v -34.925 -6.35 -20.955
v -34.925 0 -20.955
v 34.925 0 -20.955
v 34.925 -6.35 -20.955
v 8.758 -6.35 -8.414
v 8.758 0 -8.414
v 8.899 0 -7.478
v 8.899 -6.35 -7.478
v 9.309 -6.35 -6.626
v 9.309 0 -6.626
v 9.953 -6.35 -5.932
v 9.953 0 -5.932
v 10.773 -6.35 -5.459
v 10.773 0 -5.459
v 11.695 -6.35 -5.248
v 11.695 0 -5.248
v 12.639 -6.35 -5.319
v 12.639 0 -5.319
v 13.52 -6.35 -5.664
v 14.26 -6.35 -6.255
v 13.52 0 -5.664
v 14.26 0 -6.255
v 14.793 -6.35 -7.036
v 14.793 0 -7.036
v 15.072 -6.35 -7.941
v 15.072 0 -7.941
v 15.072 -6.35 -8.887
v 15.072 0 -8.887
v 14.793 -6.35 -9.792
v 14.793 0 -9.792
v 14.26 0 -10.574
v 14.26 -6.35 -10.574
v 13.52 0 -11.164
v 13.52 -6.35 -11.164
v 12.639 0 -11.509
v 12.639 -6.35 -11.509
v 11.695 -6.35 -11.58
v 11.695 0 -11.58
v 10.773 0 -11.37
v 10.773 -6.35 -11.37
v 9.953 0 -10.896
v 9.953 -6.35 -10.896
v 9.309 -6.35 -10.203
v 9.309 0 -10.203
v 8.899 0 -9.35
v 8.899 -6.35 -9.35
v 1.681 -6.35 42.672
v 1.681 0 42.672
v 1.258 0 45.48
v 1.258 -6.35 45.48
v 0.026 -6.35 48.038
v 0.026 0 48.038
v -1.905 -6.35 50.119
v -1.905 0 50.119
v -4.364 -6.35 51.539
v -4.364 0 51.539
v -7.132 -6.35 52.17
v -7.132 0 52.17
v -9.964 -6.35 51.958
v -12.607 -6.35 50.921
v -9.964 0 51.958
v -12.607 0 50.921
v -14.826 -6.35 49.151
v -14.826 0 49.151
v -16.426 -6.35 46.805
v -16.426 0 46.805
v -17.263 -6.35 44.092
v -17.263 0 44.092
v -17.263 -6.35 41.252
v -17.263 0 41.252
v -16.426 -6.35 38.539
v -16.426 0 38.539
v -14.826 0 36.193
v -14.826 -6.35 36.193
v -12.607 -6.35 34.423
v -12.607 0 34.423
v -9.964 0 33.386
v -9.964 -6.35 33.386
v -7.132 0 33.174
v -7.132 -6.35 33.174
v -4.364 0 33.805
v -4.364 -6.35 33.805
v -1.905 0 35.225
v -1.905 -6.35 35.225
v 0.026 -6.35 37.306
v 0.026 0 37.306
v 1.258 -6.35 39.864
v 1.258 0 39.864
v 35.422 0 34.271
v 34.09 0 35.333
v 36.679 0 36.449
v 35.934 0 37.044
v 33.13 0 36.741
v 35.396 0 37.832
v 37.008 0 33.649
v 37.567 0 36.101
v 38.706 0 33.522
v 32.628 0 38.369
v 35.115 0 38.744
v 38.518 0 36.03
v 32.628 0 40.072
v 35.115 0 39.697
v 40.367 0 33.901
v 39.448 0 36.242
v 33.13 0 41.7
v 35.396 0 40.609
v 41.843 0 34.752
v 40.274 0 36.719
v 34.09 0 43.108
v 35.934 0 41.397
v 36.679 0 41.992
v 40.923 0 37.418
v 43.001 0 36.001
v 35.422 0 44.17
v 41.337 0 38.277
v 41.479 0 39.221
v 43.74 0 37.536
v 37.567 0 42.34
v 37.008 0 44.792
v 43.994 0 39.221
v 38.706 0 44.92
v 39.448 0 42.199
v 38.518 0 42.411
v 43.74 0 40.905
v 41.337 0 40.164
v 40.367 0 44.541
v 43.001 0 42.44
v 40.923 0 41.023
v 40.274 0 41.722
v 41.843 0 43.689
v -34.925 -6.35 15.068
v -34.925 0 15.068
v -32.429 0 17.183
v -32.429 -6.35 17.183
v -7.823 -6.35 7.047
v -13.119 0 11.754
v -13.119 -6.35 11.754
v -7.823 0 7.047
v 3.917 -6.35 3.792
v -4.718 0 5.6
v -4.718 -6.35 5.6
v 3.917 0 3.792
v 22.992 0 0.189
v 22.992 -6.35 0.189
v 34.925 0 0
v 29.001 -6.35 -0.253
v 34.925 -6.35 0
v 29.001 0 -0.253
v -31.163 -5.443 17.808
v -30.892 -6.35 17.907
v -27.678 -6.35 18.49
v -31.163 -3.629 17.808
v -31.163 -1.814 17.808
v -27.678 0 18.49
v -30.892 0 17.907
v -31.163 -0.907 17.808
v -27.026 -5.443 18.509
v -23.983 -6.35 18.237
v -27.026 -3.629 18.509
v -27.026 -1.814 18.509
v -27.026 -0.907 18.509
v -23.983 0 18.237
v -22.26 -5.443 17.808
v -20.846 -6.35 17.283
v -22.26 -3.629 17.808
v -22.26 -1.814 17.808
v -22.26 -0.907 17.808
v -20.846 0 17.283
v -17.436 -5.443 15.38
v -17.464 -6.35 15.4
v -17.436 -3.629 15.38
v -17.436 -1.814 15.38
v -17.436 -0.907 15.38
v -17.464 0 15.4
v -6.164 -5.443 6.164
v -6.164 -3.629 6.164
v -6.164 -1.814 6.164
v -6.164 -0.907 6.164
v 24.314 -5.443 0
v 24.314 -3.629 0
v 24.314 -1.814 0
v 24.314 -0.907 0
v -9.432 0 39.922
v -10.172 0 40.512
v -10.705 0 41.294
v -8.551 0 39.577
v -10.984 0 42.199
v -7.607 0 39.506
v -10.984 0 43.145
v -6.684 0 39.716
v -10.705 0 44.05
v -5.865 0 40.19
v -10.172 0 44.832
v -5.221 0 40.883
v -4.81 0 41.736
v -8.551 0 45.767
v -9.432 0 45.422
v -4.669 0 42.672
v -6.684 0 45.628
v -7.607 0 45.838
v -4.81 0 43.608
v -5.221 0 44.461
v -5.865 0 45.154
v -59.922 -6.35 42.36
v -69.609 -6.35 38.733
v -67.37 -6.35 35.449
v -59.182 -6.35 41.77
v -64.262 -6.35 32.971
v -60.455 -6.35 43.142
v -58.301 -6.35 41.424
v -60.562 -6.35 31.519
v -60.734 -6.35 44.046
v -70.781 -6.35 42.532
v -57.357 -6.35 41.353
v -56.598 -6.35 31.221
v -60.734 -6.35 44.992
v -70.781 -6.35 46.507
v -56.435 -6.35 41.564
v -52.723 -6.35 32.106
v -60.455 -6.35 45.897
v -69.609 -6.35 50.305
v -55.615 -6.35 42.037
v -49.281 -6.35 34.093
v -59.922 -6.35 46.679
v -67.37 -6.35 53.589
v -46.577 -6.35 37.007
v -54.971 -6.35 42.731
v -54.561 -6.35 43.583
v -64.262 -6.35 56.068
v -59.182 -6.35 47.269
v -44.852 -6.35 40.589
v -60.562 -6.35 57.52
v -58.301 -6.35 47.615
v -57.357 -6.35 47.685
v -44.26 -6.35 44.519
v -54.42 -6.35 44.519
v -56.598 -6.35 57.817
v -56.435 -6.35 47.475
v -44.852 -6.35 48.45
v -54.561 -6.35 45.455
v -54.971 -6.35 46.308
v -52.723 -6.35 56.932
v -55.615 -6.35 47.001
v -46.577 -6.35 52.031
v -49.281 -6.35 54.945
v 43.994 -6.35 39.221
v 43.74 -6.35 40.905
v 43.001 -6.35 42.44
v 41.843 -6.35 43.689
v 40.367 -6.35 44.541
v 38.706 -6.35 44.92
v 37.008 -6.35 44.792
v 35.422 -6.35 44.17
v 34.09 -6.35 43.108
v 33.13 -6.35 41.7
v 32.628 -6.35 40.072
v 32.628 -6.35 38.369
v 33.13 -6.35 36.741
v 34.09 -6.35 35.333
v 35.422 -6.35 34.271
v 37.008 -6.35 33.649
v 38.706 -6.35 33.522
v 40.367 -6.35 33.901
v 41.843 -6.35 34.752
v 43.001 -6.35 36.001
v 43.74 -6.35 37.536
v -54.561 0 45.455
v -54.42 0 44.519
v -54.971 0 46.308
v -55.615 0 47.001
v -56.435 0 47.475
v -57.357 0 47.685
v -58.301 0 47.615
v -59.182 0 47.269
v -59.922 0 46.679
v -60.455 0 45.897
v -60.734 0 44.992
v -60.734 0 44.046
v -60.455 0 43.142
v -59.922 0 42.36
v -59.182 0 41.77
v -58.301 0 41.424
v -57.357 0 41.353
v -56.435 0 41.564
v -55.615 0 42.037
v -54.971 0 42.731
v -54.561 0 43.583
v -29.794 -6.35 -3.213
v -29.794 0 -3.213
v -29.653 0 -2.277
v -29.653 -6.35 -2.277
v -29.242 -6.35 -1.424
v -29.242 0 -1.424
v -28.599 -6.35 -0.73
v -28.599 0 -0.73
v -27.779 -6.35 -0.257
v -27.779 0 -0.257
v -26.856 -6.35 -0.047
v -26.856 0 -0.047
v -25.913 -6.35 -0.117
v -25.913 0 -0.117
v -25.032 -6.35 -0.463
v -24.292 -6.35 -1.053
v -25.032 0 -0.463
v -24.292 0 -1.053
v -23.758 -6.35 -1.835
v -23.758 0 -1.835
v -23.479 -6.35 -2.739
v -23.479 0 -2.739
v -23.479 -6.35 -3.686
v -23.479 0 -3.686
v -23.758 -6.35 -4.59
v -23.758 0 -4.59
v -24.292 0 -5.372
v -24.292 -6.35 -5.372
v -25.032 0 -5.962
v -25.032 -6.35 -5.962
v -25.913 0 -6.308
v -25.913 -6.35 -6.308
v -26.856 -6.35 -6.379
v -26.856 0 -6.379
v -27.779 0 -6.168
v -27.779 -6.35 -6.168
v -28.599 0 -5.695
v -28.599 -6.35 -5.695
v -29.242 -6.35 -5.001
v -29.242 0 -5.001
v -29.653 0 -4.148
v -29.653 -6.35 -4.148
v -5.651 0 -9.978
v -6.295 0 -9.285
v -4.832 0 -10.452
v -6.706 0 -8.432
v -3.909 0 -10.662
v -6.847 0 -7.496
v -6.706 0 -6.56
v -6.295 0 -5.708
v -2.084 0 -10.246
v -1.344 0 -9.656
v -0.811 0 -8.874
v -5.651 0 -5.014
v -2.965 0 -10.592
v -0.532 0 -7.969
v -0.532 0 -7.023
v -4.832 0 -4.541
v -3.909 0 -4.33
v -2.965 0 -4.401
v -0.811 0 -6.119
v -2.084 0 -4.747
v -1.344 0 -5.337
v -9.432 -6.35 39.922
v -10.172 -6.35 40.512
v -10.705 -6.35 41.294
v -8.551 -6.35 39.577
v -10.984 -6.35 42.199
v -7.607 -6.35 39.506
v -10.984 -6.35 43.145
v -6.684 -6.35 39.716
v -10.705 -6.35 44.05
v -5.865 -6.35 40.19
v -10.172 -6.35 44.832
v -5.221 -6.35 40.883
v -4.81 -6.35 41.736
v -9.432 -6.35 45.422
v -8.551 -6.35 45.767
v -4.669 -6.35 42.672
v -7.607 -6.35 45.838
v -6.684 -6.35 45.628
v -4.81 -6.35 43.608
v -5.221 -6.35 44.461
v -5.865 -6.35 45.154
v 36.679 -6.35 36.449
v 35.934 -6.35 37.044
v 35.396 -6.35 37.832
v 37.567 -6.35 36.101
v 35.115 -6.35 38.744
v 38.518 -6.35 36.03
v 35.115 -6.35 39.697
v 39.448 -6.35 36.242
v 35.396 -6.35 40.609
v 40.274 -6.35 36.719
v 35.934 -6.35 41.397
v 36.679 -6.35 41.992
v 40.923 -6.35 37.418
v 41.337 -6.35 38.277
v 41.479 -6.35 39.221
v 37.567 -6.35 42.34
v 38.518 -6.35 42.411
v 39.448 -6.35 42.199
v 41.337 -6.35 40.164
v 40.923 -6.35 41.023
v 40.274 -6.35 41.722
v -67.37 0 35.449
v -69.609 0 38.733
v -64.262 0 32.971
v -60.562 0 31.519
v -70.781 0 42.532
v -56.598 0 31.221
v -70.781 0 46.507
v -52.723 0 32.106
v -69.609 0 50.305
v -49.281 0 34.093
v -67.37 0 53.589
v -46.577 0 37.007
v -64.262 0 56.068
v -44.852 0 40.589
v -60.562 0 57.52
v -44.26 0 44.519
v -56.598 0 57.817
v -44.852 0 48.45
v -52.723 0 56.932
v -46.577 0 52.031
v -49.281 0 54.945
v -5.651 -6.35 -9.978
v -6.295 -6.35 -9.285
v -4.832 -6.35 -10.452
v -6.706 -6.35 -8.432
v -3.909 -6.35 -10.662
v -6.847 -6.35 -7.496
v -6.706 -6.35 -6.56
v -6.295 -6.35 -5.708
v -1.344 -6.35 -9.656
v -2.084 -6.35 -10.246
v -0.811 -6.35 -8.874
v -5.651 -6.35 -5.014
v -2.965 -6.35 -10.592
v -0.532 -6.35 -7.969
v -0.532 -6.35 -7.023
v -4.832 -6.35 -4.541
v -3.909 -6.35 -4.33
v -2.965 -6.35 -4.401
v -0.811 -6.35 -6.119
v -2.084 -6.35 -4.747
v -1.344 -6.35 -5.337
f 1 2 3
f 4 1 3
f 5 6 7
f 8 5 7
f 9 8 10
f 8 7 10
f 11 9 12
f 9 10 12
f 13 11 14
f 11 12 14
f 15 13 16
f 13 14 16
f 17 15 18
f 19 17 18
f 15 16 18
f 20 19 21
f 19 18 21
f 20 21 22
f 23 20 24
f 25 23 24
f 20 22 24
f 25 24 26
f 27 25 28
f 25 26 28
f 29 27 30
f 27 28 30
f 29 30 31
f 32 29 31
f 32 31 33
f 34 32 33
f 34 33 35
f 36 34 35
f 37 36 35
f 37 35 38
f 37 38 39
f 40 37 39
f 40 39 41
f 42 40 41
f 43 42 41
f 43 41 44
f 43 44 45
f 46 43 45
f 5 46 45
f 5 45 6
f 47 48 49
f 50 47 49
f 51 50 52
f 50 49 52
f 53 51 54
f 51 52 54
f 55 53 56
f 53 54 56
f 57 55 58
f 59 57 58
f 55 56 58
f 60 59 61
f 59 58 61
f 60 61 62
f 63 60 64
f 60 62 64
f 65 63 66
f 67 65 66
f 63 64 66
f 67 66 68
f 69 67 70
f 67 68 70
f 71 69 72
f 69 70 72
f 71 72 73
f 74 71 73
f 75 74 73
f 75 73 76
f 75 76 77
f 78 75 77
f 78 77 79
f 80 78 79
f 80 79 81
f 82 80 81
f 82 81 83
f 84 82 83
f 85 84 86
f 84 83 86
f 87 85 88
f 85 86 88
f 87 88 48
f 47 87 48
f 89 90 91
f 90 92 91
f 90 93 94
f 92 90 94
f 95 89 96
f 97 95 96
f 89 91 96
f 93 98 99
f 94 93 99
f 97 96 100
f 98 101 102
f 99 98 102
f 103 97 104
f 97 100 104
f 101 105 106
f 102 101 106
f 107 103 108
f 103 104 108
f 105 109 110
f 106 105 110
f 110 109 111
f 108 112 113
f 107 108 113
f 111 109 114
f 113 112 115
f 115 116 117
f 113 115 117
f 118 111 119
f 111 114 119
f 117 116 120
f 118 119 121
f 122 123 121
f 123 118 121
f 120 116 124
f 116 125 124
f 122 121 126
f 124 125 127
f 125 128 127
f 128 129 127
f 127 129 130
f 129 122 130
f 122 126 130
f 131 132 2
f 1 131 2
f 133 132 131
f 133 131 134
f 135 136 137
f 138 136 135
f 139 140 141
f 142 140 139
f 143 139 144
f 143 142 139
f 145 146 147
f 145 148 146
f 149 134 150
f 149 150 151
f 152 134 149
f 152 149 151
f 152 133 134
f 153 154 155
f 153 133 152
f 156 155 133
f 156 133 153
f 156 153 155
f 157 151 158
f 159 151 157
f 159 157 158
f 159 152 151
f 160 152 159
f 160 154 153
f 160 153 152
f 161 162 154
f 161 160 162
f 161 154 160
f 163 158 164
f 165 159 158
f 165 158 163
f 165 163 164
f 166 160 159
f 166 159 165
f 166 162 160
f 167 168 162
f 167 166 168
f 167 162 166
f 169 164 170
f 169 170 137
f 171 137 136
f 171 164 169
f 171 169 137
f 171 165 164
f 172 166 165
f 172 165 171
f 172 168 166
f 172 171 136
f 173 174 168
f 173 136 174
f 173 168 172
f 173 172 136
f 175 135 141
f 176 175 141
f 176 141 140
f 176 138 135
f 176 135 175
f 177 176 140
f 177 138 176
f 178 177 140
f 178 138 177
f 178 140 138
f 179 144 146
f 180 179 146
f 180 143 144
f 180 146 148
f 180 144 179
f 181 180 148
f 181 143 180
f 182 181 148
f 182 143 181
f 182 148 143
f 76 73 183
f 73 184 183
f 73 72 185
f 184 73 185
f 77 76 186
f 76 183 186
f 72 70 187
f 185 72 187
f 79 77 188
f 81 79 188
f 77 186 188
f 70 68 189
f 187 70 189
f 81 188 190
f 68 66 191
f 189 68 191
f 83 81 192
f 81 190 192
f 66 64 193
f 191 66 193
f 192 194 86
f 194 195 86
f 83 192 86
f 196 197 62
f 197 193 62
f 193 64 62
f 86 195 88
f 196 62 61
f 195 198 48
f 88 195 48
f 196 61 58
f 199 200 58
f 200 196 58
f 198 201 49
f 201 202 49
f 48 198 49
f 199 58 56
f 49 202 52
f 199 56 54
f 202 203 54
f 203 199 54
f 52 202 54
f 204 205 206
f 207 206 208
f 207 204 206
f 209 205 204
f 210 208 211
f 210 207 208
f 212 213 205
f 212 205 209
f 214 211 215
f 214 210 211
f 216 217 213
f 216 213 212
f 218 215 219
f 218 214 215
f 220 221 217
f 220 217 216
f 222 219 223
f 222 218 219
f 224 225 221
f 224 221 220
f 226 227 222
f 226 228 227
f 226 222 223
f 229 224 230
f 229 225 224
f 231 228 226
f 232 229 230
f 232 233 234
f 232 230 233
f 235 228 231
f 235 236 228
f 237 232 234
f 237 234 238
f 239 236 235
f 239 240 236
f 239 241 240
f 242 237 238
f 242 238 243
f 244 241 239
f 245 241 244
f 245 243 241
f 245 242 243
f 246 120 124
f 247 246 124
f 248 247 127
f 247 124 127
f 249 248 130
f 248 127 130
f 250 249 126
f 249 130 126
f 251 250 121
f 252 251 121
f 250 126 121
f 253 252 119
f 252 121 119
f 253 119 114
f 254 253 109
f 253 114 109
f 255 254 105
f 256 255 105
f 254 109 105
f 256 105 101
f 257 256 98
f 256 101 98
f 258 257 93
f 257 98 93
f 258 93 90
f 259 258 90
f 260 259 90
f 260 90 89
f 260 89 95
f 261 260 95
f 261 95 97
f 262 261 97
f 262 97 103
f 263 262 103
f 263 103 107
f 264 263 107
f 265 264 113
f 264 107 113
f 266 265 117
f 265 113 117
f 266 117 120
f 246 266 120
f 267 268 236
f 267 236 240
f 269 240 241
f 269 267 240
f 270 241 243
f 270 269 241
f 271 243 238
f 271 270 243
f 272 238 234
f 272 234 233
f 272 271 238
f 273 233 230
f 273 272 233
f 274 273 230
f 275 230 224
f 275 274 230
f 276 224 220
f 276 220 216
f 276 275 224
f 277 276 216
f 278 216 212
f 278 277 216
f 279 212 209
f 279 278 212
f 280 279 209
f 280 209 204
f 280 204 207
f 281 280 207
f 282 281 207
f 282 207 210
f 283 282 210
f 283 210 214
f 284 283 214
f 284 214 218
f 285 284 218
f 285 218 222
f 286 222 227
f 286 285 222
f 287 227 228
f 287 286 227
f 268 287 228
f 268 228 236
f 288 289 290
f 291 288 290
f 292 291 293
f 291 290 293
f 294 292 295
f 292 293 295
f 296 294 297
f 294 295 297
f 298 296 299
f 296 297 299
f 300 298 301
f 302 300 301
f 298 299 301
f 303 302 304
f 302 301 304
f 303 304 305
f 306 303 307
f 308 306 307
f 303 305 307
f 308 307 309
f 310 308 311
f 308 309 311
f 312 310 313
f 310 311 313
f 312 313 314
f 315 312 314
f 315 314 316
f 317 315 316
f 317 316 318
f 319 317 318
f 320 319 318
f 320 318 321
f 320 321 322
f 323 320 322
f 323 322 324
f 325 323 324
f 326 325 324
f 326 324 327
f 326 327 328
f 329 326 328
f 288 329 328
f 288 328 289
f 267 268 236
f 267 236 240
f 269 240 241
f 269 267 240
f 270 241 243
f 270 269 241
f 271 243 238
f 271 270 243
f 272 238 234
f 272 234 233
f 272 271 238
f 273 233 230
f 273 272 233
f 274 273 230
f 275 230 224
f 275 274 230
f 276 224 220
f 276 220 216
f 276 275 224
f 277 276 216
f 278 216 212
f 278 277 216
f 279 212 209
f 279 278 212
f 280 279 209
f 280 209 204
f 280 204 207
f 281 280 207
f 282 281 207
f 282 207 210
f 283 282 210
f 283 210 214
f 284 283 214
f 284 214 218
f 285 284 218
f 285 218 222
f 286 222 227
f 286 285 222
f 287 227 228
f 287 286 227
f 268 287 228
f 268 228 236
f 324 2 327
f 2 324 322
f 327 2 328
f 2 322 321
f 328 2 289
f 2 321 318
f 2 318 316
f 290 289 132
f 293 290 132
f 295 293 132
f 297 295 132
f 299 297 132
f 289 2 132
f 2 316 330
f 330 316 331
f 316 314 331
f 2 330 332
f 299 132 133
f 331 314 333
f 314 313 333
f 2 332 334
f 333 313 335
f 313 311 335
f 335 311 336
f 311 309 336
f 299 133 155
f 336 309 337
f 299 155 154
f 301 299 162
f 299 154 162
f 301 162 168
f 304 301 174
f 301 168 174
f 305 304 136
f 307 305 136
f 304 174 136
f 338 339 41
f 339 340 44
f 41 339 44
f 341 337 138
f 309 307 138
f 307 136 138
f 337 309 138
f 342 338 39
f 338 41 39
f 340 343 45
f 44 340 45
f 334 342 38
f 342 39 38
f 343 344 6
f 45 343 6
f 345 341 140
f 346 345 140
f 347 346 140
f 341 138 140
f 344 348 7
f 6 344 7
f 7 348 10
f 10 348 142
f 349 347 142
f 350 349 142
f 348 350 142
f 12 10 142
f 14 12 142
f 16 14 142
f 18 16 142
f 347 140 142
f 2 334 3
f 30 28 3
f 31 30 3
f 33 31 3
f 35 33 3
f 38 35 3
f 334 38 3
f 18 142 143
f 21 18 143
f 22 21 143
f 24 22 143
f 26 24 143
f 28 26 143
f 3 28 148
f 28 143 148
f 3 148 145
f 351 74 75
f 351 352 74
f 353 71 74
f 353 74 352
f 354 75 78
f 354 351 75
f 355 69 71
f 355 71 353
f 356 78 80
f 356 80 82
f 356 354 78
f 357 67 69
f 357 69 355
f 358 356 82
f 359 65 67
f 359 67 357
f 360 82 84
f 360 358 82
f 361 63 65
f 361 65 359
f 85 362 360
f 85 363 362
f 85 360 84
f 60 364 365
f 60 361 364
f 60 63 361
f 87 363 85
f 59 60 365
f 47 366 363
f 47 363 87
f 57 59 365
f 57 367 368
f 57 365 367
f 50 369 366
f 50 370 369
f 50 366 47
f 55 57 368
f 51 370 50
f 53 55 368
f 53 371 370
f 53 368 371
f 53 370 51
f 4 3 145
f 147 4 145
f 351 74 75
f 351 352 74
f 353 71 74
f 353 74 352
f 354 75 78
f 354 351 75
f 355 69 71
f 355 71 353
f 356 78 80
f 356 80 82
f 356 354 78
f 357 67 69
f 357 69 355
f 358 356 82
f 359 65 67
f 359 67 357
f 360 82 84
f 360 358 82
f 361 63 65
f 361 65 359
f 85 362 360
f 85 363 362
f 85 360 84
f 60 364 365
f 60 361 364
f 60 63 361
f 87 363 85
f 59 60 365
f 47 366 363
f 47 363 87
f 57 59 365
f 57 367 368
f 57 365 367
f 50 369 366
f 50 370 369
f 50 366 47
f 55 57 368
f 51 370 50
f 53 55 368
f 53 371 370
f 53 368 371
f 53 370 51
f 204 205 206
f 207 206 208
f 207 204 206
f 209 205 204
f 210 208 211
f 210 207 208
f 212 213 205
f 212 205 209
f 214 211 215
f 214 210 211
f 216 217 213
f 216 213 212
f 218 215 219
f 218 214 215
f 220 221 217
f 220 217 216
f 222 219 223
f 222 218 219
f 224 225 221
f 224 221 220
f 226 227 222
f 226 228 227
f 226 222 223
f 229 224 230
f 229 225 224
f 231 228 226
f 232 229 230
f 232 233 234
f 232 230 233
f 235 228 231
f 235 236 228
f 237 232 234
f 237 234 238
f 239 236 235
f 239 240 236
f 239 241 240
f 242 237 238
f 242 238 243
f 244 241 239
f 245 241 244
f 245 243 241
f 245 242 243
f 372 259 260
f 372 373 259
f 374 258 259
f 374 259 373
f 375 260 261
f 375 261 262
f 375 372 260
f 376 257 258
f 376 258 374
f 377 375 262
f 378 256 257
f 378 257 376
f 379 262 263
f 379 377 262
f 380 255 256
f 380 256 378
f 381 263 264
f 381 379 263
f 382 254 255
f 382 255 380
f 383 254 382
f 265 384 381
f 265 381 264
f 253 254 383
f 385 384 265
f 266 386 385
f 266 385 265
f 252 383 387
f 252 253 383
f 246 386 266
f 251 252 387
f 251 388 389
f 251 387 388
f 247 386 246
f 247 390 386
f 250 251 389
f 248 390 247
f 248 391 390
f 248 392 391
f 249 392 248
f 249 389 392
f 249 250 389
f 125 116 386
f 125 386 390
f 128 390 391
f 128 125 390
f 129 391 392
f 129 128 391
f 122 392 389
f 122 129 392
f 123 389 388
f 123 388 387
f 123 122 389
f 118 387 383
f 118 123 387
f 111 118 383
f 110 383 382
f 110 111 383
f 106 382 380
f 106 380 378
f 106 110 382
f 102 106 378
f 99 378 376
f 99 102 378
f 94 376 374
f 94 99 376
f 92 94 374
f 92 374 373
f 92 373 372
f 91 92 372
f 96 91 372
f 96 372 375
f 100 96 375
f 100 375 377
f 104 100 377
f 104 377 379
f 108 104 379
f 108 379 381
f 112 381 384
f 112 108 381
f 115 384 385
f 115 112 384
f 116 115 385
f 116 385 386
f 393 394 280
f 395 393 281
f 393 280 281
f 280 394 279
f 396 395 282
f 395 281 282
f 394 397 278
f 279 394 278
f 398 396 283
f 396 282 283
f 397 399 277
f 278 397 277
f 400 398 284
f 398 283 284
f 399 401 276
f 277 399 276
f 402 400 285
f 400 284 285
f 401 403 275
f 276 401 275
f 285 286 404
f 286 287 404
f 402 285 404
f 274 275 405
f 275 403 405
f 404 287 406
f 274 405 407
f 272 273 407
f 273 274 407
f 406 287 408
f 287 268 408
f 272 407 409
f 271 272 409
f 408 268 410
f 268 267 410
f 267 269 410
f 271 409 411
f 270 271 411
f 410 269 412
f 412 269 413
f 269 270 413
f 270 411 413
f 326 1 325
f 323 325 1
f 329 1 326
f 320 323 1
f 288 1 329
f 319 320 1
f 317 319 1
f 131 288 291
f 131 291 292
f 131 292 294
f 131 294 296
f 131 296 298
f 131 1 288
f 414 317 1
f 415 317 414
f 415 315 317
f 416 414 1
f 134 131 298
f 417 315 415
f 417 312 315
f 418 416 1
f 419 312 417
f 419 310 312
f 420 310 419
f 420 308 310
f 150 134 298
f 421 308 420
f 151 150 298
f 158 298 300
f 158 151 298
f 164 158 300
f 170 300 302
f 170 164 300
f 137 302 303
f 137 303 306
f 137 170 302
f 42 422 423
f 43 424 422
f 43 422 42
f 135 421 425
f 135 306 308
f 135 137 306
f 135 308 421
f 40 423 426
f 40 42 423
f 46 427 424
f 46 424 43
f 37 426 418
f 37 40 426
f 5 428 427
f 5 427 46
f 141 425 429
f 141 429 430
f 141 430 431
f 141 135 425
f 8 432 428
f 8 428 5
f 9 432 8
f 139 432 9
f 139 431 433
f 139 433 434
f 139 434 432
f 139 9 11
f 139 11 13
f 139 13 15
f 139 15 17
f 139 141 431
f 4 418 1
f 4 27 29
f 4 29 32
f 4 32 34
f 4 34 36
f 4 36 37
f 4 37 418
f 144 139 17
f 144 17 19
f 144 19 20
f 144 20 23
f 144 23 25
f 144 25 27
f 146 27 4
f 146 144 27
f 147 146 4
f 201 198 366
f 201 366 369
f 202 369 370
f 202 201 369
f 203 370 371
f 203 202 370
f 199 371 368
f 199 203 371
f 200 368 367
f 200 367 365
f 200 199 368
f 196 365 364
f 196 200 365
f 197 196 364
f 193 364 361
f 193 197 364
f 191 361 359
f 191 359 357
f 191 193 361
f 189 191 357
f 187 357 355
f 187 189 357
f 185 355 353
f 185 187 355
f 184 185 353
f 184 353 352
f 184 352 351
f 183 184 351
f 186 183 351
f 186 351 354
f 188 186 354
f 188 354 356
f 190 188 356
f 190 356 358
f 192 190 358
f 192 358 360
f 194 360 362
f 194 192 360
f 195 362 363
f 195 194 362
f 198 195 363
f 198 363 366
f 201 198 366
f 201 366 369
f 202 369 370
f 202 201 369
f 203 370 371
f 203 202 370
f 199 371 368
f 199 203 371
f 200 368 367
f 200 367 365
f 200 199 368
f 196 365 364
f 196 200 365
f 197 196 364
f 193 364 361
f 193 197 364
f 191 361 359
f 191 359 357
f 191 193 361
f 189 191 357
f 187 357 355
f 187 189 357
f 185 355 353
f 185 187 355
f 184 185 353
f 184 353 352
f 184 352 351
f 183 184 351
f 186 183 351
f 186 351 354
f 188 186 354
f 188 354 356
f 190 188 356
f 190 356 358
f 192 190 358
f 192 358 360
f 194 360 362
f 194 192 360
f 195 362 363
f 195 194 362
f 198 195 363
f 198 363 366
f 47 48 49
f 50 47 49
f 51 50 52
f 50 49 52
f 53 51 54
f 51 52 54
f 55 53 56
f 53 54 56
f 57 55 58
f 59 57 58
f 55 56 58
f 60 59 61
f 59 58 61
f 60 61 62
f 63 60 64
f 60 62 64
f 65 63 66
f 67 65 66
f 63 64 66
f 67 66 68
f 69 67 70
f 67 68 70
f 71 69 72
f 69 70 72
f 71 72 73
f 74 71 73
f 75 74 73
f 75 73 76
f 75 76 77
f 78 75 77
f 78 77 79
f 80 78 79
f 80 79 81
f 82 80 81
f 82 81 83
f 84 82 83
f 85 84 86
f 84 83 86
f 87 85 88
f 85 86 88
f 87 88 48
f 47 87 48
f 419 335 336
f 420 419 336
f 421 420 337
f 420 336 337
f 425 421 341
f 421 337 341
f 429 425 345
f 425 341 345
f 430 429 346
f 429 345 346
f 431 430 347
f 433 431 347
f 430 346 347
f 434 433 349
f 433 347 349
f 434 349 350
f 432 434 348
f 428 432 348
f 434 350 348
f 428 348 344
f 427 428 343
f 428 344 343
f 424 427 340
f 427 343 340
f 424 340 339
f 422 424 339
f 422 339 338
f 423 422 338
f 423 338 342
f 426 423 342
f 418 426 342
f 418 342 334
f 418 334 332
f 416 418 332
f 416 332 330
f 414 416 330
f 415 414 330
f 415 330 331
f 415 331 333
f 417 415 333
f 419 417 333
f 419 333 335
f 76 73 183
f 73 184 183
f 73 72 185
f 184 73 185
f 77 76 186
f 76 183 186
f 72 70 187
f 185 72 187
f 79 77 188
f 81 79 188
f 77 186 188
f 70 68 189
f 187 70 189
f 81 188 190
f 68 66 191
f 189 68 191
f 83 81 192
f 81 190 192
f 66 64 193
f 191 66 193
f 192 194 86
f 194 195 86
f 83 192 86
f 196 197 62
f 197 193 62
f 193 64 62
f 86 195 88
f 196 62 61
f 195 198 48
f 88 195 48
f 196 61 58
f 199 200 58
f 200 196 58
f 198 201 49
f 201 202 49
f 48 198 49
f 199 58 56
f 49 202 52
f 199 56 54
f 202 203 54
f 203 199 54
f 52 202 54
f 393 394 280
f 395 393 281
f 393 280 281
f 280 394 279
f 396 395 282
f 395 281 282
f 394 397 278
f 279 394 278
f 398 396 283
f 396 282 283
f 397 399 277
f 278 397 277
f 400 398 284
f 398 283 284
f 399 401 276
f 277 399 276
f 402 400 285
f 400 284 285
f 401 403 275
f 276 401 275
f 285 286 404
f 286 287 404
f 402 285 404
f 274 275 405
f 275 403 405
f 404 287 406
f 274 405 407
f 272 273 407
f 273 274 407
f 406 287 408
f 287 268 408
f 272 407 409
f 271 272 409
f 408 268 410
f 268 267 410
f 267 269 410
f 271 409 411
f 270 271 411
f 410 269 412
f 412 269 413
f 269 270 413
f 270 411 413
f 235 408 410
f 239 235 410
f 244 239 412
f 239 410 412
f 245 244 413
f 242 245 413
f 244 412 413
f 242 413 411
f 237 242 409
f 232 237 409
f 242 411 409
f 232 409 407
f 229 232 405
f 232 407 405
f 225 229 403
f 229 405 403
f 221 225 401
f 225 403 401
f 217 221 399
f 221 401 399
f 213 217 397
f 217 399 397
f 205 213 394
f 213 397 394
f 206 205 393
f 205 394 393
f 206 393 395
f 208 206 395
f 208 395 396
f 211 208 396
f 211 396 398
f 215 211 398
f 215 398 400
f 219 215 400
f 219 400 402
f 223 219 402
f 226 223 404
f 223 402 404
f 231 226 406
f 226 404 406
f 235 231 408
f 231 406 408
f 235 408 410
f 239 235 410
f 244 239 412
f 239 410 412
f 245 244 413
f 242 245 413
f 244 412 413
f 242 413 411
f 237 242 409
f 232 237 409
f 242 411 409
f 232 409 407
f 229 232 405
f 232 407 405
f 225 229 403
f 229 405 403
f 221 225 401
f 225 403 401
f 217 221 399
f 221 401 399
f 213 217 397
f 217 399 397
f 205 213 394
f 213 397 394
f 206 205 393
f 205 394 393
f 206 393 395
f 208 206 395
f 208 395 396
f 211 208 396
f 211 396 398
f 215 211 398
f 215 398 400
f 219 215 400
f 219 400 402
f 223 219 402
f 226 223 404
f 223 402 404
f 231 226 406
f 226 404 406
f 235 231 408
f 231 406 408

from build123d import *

# Parameters (mm, degrees)
F1_DEPTH = 6.35
F2_R     = 13.335
F2_R_2   = 3.175
F3_DEPTH = 6.35
F2_R_3   = 9.525
F4_DEPTH = 6.35
F2_R_4   = 5.715
F2_R_5   = 3.199782715
F7_D     = 6.35
F9_D     = 6.35
F11_D    = 6.35


with BuildPart() as f1:
    # F0 (on Front) → F1 (new body)
    with BuildSketch(Plane.XZ):
        with BuildLine():
            Line((-34.925, -20.955), (34.925, -20.955))
            Line((34.925, -20.955), (34.925, 0))
            add(Edge.make_bspline(
                [(-34.925, 15.0680310093), (-33.8749337765, 16.1178807955), (-31.3723698821, 18.6199288672), (-21.6066058687, 18.904040471), (-12.9641594898, 12.1368529586), (-6.9125027094, 4.5564810056), (11.3505046476, 3.3543035541), (23.9254899985, -0.6862175421), (31.4147522763, -0.2189909882), (34.925, 0)],
                knots=[0, 0, 0, 0, 0.095564903, 0.2277544697, 0.3722459873, 0.5069998522, 0.6921200679, 0.8556954222, 1, 1, 1, 1], degree=3))
            Line((-34.925, 15.0680310093), (-34.925, -20.955))
        make_face()
    extrude(amount=F1_DEPTH)

    # F7 (through all)
    with Locations(Plane.XZ.offset(6.35)):
        with Locations((-3.671587212, -7.4961567298)):
            Hole(F7_D / 2)

    # F9 (through all)
    with Locations(Plane.XZ.offset(6.35)):
        with Locations((-26.6190059483, -3.212638665)):
            Hole(F9_D / 2)

    # F11 (through all)
    with Locations(Plane.XZ.offset(6.35)):
        with Locations((11.9326571003, -8.4140533581)):
            Hole(F11_D / 2)


with BuildPart() as f3:
    # F2 (on Front) → F3 (new body)
    with BuildSketch(Plane.XZ):
        with Locations((-57.5947463512, 44.5191822946)):
            Circle(F2_R)
        with Locations((-57.5947463512, 44.5191822946)):
            Circle(F2_R_2, mode=Mode.SUBTRACT)
    extrude(amount=F3_DEPTH)


with BuildPart() as f3b:
    # F2 (on Front) → F3, piece 2 (new body)
    with BuildSketch(Plane.XZ):
        with Locations((-7.8441174701, 42.6720045507)):
            Circle(F2_R_3)
        with Locations((-7.8441174701, 42.6720045507)):
            Circle(F2_R_2, mode=Mode.SUBTRACT)
    extrude(amount=F3_DEPTH)


with BuildPart() as f4:
    # F2 (on Front) → F4 (new body)
    with BuildSketch(Plane.XZ):
        with Locations((-57.5947463512, 44.5191822946)):
            Circle(F2_R)
        with Locations((-57.5947463512, 44.5191822946)):
            Circle(F2_R_2, mode=Mode.SUBTRACT)
    extrude(amount=F4_DEPTH)


with BuildPart() as f4b:
    # F2 (on Front) → F4, piece 2 (new body)
    with BuildSketch(Plane.XZ):
        with Locations((-7.8441174701, 42.6720045507)):
            Circle(F2_R_3)
        with Locations((-7.8441174701, 42.6720045507)):
            Circle(F2_R_2, mode=Mode.SUBTRACT)
    extrude(amount=F4_DEPTH)


with BuildPart() as f4c:
    # F2 (on Front) → F4, piece 3 (new body)
    with BuildSketch(Plane.XZ):
        with Locations((38.2792986929, 39.2205901444)):
            Circle(F2_R_4)
        with Locations((38.2792986929, 39.2205901444)):
            Circle(F2_R_5, mode=Mode.SUBTRACT)
    extrude(amount=F4_DEPTH)


solid = Compound([f1.part, f3.part, f3b.part, f4.part, f4b.part, f4c.part])
